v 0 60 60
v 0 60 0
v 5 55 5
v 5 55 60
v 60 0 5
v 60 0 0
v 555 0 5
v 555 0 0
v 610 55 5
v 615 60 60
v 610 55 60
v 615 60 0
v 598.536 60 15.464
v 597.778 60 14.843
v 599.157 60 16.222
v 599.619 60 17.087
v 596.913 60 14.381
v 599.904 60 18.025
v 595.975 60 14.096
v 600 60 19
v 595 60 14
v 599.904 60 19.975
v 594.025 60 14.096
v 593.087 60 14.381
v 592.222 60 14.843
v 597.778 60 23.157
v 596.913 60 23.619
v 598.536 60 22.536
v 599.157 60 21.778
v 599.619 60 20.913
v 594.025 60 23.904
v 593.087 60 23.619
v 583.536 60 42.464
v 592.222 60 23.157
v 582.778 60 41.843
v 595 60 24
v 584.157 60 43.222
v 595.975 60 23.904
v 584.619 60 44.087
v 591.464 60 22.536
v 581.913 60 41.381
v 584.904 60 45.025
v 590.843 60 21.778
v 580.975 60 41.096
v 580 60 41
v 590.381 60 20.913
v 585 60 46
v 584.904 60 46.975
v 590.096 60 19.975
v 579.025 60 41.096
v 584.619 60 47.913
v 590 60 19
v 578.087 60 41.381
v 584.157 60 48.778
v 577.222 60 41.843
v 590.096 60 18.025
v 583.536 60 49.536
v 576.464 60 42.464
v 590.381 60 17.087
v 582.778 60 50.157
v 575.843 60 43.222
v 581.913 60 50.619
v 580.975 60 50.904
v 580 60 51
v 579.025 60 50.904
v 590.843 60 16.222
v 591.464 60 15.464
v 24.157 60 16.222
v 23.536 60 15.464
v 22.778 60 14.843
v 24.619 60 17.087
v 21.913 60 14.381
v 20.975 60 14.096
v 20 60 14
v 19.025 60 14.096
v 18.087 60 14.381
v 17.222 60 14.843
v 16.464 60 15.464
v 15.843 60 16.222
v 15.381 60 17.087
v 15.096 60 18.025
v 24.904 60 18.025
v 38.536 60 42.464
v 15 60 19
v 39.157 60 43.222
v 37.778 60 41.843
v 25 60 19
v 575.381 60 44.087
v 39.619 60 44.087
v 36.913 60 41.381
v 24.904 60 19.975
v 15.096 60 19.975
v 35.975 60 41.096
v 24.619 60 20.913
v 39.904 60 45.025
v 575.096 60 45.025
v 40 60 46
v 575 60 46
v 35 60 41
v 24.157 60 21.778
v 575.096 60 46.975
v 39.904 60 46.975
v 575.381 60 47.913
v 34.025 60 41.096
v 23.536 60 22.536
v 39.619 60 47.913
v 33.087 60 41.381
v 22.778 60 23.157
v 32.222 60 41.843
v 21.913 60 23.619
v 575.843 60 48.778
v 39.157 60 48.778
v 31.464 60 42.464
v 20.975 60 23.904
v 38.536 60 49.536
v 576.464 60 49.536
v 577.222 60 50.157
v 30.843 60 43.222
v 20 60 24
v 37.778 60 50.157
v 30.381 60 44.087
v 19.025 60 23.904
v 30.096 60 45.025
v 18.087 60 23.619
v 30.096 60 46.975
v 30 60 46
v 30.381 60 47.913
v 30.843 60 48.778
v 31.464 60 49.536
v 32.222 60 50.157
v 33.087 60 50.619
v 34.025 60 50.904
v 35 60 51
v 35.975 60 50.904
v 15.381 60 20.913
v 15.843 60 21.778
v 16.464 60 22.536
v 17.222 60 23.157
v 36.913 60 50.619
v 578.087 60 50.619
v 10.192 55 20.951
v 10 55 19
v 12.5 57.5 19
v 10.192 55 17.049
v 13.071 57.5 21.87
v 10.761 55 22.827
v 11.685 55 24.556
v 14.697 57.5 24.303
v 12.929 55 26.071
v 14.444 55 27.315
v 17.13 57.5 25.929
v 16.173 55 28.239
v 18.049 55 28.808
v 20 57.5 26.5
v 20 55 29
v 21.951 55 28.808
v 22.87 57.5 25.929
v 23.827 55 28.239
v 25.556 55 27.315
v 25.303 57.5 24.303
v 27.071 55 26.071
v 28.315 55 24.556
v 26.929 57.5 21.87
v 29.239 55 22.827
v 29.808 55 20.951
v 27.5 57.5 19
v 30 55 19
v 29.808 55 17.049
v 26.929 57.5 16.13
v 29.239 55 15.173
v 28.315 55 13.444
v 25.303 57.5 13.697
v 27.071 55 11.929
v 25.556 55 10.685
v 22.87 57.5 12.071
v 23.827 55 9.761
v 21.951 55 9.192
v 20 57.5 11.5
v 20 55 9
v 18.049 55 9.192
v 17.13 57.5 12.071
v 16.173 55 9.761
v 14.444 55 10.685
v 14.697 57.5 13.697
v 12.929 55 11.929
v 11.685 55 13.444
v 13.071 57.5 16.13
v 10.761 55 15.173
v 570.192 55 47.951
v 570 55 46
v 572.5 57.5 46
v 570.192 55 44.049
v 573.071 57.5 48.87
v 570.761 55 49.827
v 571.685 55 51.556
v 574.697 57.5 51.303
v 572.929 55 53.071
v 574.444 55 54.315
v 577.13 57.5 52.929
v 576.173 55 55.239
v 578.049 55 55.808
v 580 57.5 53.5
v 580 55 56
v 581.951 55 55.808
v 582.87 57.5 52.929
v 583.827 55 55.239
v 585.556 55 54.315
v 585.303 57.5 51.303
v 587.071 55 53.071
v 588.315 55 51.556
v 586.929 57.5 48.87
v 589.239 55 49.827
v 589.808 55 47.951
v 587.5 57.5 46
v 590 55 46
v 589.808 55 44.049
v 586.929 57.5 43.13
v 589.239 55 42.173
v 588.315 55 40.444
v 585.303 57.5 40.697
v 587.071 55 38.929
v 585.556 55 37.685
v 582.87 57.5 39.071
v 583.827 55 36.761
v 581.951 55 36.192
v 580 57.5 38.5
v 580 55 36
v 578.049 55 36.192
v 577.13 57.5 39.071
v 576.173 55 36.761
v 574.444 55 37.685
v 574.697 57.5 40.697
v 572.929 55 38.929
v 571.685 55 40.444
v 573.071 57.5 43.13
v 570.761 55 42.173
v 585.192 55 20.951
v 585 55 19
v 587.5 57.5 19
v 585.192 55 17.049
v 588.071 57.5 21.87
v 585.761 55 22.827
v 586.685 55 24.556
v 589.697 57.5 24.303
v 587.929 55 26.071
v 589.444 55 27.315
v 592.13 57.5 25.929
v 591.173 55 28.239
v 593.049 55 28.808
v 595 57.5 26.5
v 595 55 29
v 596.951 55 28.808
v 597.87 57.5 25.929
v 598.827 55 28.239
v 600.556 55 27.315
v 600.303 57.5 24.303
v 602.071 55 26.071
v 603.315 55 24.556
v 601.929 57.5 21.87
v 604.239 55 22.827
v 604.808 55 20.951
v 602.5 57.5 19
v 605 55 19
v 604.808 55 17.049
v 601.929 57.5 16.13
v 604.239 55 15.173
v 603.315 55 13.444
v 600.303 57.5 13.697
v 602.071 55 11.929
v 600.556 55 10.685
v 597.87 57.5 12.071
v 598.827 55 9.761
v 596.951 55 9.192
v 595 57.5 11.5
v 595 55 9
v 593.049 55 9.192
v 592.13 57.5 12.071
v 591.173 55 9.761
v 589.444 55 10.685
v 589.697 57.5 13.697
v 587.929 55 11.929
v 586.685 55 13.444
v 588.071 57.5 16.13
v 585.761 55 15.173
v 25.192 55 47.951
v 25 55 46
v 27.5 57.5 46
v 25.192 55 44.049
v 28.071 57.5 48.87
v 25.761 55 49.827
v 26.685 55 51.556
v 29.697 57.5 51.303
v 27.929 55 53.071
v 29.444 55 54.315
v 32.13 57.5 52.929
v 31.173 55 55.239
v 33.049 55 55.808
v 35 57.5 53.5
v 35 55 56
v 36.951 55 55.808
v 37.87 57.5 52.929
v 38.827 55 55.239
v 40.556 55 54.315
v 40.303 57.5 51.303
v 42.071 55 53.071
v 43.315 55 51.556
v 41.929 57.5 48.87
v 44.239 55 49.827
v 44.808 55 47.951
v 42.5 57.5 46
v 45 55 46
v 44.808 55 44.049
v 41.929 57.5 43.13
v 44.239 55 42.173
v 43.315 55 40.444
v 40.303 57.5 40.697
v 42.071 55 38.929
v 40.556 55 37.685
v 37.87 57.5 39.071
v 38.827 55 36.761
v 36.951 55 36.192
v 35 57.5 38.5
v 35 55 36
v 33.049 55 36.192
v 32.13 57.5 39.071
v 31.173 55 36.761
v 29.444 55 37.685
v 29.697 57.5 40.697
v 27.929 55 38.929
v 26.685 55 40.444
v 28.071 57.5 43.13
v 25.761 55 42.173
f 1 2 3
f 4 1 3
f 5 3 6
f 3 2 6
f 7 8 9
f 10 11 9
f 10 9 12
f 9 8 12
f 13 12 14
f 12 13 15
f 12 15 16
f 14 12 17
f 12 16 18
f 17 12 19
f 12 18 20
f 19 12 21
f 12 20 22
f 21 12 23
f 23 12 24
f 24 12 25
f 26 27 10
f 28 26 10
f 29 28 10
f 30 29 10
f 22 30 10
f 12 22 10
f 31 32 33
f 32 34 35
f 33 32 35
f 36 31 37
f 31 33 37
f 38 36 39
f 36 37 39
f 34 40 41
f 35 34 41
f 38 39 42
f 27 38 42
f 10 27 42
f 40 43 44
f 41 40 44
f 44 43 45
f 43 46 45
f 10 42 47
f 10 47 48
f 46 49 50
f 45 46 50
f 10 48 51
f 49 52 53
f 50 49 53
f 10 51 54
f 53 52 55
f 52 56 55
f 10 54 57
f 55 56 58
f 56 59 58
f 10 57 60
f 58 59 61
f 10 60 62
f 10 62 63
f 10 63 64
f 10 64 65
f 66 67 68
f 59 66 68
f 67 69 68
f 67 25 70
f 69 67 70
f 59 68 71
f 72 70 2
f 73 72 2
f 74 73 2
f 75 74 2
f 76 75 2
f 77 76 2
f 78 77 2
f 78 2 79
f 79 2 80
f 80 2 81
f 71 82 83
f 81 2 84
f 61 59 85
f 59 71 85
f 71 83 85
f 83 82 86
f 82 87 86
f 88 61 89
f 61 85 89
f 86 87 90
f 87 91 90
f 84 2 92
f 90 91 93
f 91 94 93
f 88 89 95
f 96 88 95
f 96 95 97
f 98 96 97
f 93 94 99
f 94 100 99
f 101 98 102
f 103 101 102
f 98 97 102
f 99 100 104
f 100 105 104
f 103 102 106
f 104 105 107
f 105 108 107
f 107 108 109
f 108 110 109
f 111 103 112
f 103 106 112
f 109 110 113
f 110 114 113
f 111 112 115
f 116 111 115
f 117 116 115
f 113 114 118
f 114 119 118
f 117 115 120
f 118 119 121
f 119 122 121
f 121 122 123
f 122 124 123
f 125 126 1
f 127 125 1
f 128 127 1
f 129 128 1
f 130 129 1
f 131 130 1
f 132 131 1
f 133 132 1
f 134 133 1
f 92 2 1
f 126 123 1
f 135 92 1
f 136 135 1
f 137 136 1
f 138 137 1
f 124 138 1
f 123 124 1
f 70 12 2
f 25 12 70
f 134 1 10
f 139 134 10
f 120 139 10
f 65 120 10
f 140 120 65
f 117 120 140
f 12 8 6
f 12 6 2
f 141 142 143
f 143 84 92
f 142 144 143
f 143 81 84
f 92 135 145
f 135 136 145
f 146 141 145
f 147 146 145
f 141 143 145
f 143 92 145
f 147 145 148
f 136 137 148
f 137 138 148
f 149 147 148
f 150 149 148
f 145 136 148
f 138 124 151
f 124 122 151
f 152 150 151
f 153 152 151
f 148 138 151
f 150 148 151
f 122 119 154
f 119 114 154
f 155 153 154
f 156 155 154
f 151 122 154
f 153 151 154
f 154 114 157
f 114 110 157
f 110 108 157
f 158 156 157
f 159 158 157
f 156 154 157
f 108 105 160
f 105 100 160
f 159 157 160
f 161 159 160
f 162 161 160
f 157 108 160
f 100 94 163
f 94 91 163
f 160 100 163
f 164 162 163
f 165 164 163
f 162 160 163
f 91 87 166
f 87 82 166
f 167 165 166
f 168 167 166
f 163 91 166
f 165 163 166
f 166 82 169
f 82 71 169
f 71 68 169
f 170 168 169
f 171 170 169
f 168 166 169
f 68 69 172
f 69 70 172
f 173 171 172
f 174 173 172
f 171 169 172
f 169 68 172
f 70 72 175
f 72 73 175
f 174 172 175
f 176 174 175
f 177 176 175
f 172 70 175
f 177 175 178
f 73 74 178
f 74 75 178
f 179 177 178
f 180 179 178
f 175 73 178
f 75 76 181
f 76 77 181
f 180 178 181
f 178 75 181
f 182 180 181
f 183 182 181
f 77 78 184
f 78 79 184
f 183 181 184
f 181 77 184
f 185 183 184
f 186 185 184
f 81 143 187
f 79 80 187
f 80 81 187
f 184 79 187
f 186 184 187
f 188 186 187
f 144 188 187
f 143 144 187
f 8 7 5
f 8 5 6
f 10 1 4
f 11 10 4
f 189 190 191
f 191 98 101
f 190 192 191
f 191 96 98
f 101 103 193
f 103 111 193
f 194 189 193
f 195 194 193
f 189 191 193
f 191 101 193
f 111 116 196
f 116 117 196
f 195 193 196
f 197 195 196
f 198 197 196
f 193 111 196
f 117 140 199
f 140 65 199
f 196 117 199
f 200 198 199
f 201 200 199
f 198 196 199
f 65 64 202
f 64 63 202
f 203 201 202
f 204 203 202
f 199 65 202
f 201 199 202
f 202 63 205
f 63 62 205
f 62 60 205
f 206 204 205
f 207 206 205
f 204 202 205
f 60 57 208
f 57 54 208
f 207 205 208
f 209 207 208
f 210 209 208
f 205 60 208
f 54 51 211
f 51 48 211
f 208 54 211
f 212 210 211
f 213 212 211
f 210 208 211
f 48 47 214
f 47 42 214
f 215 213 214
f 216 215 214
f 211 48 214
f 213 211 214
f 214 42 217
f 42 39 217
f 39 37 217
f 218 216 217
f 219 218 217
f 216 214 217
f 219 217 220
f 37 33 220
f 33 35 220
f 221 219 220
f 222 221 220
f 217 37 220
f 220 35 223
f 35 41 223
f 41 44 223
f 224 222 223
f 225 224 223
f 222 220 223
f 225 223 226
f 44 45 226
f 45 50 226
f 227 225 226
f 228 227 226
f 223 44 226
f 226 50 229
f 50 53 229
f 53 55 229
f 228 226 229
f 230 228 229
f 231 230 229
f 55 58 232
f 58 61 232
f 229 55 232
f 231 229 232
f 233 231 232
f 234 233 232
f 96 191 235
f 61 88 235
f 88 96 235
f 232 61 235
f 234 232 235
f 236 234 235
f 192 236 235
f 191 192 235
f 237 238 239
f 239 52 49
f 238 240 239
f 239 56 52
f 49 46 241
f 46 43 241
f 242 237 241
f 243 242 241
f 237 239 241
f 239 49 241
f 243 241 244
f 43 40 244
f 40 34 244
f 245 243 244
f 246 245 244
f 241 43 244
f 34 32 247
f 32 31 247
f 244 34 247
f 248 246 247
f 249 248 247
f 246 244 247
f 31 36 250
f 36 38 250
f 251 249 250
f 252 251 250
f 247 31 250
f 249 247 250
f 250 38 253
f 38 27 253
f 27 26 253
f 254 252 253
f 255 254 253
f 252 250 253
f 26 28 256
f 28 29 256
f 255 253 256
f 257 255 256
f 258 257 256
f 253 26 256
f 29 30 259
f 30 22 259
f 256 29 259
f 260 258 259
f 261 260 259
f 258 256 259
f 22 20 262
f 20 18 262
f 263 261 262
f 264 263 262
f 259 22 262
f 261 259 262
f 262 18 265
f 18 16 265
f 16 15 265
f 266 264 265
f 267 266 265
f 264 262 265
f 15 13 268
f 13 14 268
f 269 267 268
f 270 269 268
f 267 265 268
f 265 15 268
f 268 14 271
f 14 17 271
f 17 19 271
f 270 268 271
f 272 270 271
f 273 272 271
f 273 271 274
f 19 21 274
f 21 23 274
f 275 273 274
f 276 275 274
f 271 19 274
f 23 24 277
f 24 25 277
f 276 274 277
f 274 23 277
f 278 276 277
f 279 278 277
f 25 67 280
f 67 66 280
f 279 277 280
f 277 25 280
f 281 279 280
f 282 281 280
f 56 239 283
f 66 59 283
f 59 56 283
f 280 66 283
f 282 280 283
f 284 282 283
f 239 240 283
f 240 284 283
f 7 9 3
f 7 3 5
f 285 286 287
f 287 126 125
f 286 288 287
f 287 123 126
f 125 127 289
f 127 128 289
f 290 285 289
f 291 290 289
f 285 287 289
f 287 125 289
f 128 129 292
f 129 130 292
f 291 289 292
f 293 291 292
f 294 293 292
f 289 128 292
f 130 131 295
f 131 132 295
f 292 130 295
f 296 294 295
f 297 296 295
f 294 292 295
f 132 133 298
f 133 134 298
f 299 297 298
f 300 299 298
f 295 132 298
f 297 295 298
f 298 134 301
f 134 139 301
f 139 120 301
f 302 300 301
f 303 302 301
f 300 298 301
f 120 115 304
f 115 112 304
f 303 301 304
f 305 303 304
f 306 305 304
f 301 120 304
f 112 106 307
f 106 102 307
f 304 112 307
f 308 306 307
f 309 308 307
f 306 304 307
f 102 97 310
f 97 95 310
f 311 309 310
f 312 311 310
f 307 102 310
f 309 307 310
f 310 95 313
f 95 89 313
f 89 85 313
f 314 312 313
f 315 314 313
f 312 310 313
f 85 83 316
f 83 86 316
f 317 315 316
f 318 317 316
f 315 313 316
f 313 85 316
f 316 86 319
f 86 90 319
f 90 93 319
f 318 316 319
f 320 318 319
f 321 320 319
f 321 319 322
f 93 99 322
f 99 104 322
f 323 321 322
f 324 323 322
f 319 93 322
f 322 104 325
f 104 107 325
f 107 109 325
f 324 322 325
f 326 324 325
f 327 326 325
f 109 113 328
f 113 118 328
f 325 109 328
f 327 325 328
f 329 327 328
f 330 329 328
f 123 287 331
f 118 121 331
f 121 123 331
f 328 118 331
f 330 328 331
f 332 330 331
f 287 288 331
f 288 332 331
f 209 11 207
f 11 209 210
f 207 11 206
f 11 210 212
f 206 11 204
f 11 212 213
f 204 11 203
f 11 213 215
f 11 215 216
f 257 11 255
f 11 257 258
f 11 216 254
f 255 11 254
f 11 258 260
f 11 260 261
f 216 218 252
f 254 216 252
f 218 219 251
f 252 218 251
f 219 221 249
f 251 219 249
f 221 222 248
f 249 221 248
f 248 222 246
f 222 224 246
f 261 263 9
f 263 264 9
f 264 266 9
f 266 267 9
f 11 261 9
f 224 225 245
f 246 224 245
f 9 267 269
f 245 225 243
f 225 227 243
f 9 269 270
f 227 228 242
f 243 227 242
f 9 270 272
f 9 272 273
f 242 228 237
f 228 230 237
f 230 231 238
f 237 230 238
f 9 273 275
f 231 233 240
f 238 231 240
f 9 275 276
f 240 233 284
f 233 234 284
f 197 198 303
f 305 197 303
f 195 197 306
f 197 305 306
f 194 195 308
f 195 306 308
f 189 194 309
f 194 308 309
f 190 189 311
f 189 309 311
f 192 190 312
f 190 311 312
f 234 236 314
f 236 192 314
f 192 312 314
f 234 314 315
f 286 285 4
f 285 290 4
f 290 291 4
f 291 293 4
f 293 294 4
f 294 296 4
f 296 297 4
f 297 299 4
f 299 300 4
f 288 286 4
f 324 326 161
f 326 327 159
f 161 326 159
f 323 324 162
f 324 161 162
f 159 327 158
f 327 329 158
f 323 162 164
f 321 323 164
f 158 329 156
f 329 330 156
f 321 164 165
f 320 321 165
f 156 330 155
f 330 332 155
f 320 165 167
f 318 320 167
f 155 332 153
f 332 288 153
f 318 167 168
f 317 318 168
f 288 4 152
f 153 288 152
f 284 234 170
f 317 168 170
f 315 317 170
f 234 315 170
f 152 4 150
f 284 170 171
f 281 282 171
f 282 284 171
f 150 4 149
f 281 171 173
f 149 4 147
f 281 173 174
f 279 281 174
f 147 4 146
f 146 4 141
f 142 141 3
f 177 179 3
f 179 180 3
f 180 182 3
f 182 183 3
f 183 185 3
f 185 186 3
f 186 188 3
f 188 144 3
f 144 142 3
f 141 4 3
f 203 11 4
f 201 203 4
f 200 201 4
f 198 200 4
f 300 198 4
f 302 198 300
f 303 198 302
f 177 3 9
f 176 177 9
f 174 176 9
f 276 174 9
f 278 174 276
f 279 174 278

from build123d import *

# Parameters (mm, degrees)
F1_DEPTH       = 615
F3_DEPTH       = 60
F5_D           = 9
F5_CSINK_D     = 20
F5_CSINK_ANGLE = 90


with BuildPart() as f1:
    # F0 (on Right) → F1 (new body)
    with BuildSketch(Plane.YZ):
        Polygon((0, 5), (0, 0), (60, 0), (60, 60), (55, 60), (55, 5), align=None)
    extrude(amount=F1_DEPTH)

    # F2 (on face) → F3 (cut, through all)
    with BuildSketch(Plane(origin=(0, 0, 0), x_dir=(1, 0, 0), z_dir=(0, 0, -1))):
        Polygon((0, 0), (0, -60), (60, 0), align=None)
        Polygon((555, 0), (615, -60), (615, 0), align=None)
    extrude(amount=-F3_DEPTH, mode=Mode.SUBTRACT)

    # F5 (through all)
    with Locations(Plane.XZ.offset(-55)):
        with Locations((35, 46), (20, 19), (580, 46), (595, 19)):
            CounterSinkHole(F5_D / 2, F5_CSINK_D / 2, counter_sink_angle=F5_CSINK_ANGLE)


solid = f1.part
